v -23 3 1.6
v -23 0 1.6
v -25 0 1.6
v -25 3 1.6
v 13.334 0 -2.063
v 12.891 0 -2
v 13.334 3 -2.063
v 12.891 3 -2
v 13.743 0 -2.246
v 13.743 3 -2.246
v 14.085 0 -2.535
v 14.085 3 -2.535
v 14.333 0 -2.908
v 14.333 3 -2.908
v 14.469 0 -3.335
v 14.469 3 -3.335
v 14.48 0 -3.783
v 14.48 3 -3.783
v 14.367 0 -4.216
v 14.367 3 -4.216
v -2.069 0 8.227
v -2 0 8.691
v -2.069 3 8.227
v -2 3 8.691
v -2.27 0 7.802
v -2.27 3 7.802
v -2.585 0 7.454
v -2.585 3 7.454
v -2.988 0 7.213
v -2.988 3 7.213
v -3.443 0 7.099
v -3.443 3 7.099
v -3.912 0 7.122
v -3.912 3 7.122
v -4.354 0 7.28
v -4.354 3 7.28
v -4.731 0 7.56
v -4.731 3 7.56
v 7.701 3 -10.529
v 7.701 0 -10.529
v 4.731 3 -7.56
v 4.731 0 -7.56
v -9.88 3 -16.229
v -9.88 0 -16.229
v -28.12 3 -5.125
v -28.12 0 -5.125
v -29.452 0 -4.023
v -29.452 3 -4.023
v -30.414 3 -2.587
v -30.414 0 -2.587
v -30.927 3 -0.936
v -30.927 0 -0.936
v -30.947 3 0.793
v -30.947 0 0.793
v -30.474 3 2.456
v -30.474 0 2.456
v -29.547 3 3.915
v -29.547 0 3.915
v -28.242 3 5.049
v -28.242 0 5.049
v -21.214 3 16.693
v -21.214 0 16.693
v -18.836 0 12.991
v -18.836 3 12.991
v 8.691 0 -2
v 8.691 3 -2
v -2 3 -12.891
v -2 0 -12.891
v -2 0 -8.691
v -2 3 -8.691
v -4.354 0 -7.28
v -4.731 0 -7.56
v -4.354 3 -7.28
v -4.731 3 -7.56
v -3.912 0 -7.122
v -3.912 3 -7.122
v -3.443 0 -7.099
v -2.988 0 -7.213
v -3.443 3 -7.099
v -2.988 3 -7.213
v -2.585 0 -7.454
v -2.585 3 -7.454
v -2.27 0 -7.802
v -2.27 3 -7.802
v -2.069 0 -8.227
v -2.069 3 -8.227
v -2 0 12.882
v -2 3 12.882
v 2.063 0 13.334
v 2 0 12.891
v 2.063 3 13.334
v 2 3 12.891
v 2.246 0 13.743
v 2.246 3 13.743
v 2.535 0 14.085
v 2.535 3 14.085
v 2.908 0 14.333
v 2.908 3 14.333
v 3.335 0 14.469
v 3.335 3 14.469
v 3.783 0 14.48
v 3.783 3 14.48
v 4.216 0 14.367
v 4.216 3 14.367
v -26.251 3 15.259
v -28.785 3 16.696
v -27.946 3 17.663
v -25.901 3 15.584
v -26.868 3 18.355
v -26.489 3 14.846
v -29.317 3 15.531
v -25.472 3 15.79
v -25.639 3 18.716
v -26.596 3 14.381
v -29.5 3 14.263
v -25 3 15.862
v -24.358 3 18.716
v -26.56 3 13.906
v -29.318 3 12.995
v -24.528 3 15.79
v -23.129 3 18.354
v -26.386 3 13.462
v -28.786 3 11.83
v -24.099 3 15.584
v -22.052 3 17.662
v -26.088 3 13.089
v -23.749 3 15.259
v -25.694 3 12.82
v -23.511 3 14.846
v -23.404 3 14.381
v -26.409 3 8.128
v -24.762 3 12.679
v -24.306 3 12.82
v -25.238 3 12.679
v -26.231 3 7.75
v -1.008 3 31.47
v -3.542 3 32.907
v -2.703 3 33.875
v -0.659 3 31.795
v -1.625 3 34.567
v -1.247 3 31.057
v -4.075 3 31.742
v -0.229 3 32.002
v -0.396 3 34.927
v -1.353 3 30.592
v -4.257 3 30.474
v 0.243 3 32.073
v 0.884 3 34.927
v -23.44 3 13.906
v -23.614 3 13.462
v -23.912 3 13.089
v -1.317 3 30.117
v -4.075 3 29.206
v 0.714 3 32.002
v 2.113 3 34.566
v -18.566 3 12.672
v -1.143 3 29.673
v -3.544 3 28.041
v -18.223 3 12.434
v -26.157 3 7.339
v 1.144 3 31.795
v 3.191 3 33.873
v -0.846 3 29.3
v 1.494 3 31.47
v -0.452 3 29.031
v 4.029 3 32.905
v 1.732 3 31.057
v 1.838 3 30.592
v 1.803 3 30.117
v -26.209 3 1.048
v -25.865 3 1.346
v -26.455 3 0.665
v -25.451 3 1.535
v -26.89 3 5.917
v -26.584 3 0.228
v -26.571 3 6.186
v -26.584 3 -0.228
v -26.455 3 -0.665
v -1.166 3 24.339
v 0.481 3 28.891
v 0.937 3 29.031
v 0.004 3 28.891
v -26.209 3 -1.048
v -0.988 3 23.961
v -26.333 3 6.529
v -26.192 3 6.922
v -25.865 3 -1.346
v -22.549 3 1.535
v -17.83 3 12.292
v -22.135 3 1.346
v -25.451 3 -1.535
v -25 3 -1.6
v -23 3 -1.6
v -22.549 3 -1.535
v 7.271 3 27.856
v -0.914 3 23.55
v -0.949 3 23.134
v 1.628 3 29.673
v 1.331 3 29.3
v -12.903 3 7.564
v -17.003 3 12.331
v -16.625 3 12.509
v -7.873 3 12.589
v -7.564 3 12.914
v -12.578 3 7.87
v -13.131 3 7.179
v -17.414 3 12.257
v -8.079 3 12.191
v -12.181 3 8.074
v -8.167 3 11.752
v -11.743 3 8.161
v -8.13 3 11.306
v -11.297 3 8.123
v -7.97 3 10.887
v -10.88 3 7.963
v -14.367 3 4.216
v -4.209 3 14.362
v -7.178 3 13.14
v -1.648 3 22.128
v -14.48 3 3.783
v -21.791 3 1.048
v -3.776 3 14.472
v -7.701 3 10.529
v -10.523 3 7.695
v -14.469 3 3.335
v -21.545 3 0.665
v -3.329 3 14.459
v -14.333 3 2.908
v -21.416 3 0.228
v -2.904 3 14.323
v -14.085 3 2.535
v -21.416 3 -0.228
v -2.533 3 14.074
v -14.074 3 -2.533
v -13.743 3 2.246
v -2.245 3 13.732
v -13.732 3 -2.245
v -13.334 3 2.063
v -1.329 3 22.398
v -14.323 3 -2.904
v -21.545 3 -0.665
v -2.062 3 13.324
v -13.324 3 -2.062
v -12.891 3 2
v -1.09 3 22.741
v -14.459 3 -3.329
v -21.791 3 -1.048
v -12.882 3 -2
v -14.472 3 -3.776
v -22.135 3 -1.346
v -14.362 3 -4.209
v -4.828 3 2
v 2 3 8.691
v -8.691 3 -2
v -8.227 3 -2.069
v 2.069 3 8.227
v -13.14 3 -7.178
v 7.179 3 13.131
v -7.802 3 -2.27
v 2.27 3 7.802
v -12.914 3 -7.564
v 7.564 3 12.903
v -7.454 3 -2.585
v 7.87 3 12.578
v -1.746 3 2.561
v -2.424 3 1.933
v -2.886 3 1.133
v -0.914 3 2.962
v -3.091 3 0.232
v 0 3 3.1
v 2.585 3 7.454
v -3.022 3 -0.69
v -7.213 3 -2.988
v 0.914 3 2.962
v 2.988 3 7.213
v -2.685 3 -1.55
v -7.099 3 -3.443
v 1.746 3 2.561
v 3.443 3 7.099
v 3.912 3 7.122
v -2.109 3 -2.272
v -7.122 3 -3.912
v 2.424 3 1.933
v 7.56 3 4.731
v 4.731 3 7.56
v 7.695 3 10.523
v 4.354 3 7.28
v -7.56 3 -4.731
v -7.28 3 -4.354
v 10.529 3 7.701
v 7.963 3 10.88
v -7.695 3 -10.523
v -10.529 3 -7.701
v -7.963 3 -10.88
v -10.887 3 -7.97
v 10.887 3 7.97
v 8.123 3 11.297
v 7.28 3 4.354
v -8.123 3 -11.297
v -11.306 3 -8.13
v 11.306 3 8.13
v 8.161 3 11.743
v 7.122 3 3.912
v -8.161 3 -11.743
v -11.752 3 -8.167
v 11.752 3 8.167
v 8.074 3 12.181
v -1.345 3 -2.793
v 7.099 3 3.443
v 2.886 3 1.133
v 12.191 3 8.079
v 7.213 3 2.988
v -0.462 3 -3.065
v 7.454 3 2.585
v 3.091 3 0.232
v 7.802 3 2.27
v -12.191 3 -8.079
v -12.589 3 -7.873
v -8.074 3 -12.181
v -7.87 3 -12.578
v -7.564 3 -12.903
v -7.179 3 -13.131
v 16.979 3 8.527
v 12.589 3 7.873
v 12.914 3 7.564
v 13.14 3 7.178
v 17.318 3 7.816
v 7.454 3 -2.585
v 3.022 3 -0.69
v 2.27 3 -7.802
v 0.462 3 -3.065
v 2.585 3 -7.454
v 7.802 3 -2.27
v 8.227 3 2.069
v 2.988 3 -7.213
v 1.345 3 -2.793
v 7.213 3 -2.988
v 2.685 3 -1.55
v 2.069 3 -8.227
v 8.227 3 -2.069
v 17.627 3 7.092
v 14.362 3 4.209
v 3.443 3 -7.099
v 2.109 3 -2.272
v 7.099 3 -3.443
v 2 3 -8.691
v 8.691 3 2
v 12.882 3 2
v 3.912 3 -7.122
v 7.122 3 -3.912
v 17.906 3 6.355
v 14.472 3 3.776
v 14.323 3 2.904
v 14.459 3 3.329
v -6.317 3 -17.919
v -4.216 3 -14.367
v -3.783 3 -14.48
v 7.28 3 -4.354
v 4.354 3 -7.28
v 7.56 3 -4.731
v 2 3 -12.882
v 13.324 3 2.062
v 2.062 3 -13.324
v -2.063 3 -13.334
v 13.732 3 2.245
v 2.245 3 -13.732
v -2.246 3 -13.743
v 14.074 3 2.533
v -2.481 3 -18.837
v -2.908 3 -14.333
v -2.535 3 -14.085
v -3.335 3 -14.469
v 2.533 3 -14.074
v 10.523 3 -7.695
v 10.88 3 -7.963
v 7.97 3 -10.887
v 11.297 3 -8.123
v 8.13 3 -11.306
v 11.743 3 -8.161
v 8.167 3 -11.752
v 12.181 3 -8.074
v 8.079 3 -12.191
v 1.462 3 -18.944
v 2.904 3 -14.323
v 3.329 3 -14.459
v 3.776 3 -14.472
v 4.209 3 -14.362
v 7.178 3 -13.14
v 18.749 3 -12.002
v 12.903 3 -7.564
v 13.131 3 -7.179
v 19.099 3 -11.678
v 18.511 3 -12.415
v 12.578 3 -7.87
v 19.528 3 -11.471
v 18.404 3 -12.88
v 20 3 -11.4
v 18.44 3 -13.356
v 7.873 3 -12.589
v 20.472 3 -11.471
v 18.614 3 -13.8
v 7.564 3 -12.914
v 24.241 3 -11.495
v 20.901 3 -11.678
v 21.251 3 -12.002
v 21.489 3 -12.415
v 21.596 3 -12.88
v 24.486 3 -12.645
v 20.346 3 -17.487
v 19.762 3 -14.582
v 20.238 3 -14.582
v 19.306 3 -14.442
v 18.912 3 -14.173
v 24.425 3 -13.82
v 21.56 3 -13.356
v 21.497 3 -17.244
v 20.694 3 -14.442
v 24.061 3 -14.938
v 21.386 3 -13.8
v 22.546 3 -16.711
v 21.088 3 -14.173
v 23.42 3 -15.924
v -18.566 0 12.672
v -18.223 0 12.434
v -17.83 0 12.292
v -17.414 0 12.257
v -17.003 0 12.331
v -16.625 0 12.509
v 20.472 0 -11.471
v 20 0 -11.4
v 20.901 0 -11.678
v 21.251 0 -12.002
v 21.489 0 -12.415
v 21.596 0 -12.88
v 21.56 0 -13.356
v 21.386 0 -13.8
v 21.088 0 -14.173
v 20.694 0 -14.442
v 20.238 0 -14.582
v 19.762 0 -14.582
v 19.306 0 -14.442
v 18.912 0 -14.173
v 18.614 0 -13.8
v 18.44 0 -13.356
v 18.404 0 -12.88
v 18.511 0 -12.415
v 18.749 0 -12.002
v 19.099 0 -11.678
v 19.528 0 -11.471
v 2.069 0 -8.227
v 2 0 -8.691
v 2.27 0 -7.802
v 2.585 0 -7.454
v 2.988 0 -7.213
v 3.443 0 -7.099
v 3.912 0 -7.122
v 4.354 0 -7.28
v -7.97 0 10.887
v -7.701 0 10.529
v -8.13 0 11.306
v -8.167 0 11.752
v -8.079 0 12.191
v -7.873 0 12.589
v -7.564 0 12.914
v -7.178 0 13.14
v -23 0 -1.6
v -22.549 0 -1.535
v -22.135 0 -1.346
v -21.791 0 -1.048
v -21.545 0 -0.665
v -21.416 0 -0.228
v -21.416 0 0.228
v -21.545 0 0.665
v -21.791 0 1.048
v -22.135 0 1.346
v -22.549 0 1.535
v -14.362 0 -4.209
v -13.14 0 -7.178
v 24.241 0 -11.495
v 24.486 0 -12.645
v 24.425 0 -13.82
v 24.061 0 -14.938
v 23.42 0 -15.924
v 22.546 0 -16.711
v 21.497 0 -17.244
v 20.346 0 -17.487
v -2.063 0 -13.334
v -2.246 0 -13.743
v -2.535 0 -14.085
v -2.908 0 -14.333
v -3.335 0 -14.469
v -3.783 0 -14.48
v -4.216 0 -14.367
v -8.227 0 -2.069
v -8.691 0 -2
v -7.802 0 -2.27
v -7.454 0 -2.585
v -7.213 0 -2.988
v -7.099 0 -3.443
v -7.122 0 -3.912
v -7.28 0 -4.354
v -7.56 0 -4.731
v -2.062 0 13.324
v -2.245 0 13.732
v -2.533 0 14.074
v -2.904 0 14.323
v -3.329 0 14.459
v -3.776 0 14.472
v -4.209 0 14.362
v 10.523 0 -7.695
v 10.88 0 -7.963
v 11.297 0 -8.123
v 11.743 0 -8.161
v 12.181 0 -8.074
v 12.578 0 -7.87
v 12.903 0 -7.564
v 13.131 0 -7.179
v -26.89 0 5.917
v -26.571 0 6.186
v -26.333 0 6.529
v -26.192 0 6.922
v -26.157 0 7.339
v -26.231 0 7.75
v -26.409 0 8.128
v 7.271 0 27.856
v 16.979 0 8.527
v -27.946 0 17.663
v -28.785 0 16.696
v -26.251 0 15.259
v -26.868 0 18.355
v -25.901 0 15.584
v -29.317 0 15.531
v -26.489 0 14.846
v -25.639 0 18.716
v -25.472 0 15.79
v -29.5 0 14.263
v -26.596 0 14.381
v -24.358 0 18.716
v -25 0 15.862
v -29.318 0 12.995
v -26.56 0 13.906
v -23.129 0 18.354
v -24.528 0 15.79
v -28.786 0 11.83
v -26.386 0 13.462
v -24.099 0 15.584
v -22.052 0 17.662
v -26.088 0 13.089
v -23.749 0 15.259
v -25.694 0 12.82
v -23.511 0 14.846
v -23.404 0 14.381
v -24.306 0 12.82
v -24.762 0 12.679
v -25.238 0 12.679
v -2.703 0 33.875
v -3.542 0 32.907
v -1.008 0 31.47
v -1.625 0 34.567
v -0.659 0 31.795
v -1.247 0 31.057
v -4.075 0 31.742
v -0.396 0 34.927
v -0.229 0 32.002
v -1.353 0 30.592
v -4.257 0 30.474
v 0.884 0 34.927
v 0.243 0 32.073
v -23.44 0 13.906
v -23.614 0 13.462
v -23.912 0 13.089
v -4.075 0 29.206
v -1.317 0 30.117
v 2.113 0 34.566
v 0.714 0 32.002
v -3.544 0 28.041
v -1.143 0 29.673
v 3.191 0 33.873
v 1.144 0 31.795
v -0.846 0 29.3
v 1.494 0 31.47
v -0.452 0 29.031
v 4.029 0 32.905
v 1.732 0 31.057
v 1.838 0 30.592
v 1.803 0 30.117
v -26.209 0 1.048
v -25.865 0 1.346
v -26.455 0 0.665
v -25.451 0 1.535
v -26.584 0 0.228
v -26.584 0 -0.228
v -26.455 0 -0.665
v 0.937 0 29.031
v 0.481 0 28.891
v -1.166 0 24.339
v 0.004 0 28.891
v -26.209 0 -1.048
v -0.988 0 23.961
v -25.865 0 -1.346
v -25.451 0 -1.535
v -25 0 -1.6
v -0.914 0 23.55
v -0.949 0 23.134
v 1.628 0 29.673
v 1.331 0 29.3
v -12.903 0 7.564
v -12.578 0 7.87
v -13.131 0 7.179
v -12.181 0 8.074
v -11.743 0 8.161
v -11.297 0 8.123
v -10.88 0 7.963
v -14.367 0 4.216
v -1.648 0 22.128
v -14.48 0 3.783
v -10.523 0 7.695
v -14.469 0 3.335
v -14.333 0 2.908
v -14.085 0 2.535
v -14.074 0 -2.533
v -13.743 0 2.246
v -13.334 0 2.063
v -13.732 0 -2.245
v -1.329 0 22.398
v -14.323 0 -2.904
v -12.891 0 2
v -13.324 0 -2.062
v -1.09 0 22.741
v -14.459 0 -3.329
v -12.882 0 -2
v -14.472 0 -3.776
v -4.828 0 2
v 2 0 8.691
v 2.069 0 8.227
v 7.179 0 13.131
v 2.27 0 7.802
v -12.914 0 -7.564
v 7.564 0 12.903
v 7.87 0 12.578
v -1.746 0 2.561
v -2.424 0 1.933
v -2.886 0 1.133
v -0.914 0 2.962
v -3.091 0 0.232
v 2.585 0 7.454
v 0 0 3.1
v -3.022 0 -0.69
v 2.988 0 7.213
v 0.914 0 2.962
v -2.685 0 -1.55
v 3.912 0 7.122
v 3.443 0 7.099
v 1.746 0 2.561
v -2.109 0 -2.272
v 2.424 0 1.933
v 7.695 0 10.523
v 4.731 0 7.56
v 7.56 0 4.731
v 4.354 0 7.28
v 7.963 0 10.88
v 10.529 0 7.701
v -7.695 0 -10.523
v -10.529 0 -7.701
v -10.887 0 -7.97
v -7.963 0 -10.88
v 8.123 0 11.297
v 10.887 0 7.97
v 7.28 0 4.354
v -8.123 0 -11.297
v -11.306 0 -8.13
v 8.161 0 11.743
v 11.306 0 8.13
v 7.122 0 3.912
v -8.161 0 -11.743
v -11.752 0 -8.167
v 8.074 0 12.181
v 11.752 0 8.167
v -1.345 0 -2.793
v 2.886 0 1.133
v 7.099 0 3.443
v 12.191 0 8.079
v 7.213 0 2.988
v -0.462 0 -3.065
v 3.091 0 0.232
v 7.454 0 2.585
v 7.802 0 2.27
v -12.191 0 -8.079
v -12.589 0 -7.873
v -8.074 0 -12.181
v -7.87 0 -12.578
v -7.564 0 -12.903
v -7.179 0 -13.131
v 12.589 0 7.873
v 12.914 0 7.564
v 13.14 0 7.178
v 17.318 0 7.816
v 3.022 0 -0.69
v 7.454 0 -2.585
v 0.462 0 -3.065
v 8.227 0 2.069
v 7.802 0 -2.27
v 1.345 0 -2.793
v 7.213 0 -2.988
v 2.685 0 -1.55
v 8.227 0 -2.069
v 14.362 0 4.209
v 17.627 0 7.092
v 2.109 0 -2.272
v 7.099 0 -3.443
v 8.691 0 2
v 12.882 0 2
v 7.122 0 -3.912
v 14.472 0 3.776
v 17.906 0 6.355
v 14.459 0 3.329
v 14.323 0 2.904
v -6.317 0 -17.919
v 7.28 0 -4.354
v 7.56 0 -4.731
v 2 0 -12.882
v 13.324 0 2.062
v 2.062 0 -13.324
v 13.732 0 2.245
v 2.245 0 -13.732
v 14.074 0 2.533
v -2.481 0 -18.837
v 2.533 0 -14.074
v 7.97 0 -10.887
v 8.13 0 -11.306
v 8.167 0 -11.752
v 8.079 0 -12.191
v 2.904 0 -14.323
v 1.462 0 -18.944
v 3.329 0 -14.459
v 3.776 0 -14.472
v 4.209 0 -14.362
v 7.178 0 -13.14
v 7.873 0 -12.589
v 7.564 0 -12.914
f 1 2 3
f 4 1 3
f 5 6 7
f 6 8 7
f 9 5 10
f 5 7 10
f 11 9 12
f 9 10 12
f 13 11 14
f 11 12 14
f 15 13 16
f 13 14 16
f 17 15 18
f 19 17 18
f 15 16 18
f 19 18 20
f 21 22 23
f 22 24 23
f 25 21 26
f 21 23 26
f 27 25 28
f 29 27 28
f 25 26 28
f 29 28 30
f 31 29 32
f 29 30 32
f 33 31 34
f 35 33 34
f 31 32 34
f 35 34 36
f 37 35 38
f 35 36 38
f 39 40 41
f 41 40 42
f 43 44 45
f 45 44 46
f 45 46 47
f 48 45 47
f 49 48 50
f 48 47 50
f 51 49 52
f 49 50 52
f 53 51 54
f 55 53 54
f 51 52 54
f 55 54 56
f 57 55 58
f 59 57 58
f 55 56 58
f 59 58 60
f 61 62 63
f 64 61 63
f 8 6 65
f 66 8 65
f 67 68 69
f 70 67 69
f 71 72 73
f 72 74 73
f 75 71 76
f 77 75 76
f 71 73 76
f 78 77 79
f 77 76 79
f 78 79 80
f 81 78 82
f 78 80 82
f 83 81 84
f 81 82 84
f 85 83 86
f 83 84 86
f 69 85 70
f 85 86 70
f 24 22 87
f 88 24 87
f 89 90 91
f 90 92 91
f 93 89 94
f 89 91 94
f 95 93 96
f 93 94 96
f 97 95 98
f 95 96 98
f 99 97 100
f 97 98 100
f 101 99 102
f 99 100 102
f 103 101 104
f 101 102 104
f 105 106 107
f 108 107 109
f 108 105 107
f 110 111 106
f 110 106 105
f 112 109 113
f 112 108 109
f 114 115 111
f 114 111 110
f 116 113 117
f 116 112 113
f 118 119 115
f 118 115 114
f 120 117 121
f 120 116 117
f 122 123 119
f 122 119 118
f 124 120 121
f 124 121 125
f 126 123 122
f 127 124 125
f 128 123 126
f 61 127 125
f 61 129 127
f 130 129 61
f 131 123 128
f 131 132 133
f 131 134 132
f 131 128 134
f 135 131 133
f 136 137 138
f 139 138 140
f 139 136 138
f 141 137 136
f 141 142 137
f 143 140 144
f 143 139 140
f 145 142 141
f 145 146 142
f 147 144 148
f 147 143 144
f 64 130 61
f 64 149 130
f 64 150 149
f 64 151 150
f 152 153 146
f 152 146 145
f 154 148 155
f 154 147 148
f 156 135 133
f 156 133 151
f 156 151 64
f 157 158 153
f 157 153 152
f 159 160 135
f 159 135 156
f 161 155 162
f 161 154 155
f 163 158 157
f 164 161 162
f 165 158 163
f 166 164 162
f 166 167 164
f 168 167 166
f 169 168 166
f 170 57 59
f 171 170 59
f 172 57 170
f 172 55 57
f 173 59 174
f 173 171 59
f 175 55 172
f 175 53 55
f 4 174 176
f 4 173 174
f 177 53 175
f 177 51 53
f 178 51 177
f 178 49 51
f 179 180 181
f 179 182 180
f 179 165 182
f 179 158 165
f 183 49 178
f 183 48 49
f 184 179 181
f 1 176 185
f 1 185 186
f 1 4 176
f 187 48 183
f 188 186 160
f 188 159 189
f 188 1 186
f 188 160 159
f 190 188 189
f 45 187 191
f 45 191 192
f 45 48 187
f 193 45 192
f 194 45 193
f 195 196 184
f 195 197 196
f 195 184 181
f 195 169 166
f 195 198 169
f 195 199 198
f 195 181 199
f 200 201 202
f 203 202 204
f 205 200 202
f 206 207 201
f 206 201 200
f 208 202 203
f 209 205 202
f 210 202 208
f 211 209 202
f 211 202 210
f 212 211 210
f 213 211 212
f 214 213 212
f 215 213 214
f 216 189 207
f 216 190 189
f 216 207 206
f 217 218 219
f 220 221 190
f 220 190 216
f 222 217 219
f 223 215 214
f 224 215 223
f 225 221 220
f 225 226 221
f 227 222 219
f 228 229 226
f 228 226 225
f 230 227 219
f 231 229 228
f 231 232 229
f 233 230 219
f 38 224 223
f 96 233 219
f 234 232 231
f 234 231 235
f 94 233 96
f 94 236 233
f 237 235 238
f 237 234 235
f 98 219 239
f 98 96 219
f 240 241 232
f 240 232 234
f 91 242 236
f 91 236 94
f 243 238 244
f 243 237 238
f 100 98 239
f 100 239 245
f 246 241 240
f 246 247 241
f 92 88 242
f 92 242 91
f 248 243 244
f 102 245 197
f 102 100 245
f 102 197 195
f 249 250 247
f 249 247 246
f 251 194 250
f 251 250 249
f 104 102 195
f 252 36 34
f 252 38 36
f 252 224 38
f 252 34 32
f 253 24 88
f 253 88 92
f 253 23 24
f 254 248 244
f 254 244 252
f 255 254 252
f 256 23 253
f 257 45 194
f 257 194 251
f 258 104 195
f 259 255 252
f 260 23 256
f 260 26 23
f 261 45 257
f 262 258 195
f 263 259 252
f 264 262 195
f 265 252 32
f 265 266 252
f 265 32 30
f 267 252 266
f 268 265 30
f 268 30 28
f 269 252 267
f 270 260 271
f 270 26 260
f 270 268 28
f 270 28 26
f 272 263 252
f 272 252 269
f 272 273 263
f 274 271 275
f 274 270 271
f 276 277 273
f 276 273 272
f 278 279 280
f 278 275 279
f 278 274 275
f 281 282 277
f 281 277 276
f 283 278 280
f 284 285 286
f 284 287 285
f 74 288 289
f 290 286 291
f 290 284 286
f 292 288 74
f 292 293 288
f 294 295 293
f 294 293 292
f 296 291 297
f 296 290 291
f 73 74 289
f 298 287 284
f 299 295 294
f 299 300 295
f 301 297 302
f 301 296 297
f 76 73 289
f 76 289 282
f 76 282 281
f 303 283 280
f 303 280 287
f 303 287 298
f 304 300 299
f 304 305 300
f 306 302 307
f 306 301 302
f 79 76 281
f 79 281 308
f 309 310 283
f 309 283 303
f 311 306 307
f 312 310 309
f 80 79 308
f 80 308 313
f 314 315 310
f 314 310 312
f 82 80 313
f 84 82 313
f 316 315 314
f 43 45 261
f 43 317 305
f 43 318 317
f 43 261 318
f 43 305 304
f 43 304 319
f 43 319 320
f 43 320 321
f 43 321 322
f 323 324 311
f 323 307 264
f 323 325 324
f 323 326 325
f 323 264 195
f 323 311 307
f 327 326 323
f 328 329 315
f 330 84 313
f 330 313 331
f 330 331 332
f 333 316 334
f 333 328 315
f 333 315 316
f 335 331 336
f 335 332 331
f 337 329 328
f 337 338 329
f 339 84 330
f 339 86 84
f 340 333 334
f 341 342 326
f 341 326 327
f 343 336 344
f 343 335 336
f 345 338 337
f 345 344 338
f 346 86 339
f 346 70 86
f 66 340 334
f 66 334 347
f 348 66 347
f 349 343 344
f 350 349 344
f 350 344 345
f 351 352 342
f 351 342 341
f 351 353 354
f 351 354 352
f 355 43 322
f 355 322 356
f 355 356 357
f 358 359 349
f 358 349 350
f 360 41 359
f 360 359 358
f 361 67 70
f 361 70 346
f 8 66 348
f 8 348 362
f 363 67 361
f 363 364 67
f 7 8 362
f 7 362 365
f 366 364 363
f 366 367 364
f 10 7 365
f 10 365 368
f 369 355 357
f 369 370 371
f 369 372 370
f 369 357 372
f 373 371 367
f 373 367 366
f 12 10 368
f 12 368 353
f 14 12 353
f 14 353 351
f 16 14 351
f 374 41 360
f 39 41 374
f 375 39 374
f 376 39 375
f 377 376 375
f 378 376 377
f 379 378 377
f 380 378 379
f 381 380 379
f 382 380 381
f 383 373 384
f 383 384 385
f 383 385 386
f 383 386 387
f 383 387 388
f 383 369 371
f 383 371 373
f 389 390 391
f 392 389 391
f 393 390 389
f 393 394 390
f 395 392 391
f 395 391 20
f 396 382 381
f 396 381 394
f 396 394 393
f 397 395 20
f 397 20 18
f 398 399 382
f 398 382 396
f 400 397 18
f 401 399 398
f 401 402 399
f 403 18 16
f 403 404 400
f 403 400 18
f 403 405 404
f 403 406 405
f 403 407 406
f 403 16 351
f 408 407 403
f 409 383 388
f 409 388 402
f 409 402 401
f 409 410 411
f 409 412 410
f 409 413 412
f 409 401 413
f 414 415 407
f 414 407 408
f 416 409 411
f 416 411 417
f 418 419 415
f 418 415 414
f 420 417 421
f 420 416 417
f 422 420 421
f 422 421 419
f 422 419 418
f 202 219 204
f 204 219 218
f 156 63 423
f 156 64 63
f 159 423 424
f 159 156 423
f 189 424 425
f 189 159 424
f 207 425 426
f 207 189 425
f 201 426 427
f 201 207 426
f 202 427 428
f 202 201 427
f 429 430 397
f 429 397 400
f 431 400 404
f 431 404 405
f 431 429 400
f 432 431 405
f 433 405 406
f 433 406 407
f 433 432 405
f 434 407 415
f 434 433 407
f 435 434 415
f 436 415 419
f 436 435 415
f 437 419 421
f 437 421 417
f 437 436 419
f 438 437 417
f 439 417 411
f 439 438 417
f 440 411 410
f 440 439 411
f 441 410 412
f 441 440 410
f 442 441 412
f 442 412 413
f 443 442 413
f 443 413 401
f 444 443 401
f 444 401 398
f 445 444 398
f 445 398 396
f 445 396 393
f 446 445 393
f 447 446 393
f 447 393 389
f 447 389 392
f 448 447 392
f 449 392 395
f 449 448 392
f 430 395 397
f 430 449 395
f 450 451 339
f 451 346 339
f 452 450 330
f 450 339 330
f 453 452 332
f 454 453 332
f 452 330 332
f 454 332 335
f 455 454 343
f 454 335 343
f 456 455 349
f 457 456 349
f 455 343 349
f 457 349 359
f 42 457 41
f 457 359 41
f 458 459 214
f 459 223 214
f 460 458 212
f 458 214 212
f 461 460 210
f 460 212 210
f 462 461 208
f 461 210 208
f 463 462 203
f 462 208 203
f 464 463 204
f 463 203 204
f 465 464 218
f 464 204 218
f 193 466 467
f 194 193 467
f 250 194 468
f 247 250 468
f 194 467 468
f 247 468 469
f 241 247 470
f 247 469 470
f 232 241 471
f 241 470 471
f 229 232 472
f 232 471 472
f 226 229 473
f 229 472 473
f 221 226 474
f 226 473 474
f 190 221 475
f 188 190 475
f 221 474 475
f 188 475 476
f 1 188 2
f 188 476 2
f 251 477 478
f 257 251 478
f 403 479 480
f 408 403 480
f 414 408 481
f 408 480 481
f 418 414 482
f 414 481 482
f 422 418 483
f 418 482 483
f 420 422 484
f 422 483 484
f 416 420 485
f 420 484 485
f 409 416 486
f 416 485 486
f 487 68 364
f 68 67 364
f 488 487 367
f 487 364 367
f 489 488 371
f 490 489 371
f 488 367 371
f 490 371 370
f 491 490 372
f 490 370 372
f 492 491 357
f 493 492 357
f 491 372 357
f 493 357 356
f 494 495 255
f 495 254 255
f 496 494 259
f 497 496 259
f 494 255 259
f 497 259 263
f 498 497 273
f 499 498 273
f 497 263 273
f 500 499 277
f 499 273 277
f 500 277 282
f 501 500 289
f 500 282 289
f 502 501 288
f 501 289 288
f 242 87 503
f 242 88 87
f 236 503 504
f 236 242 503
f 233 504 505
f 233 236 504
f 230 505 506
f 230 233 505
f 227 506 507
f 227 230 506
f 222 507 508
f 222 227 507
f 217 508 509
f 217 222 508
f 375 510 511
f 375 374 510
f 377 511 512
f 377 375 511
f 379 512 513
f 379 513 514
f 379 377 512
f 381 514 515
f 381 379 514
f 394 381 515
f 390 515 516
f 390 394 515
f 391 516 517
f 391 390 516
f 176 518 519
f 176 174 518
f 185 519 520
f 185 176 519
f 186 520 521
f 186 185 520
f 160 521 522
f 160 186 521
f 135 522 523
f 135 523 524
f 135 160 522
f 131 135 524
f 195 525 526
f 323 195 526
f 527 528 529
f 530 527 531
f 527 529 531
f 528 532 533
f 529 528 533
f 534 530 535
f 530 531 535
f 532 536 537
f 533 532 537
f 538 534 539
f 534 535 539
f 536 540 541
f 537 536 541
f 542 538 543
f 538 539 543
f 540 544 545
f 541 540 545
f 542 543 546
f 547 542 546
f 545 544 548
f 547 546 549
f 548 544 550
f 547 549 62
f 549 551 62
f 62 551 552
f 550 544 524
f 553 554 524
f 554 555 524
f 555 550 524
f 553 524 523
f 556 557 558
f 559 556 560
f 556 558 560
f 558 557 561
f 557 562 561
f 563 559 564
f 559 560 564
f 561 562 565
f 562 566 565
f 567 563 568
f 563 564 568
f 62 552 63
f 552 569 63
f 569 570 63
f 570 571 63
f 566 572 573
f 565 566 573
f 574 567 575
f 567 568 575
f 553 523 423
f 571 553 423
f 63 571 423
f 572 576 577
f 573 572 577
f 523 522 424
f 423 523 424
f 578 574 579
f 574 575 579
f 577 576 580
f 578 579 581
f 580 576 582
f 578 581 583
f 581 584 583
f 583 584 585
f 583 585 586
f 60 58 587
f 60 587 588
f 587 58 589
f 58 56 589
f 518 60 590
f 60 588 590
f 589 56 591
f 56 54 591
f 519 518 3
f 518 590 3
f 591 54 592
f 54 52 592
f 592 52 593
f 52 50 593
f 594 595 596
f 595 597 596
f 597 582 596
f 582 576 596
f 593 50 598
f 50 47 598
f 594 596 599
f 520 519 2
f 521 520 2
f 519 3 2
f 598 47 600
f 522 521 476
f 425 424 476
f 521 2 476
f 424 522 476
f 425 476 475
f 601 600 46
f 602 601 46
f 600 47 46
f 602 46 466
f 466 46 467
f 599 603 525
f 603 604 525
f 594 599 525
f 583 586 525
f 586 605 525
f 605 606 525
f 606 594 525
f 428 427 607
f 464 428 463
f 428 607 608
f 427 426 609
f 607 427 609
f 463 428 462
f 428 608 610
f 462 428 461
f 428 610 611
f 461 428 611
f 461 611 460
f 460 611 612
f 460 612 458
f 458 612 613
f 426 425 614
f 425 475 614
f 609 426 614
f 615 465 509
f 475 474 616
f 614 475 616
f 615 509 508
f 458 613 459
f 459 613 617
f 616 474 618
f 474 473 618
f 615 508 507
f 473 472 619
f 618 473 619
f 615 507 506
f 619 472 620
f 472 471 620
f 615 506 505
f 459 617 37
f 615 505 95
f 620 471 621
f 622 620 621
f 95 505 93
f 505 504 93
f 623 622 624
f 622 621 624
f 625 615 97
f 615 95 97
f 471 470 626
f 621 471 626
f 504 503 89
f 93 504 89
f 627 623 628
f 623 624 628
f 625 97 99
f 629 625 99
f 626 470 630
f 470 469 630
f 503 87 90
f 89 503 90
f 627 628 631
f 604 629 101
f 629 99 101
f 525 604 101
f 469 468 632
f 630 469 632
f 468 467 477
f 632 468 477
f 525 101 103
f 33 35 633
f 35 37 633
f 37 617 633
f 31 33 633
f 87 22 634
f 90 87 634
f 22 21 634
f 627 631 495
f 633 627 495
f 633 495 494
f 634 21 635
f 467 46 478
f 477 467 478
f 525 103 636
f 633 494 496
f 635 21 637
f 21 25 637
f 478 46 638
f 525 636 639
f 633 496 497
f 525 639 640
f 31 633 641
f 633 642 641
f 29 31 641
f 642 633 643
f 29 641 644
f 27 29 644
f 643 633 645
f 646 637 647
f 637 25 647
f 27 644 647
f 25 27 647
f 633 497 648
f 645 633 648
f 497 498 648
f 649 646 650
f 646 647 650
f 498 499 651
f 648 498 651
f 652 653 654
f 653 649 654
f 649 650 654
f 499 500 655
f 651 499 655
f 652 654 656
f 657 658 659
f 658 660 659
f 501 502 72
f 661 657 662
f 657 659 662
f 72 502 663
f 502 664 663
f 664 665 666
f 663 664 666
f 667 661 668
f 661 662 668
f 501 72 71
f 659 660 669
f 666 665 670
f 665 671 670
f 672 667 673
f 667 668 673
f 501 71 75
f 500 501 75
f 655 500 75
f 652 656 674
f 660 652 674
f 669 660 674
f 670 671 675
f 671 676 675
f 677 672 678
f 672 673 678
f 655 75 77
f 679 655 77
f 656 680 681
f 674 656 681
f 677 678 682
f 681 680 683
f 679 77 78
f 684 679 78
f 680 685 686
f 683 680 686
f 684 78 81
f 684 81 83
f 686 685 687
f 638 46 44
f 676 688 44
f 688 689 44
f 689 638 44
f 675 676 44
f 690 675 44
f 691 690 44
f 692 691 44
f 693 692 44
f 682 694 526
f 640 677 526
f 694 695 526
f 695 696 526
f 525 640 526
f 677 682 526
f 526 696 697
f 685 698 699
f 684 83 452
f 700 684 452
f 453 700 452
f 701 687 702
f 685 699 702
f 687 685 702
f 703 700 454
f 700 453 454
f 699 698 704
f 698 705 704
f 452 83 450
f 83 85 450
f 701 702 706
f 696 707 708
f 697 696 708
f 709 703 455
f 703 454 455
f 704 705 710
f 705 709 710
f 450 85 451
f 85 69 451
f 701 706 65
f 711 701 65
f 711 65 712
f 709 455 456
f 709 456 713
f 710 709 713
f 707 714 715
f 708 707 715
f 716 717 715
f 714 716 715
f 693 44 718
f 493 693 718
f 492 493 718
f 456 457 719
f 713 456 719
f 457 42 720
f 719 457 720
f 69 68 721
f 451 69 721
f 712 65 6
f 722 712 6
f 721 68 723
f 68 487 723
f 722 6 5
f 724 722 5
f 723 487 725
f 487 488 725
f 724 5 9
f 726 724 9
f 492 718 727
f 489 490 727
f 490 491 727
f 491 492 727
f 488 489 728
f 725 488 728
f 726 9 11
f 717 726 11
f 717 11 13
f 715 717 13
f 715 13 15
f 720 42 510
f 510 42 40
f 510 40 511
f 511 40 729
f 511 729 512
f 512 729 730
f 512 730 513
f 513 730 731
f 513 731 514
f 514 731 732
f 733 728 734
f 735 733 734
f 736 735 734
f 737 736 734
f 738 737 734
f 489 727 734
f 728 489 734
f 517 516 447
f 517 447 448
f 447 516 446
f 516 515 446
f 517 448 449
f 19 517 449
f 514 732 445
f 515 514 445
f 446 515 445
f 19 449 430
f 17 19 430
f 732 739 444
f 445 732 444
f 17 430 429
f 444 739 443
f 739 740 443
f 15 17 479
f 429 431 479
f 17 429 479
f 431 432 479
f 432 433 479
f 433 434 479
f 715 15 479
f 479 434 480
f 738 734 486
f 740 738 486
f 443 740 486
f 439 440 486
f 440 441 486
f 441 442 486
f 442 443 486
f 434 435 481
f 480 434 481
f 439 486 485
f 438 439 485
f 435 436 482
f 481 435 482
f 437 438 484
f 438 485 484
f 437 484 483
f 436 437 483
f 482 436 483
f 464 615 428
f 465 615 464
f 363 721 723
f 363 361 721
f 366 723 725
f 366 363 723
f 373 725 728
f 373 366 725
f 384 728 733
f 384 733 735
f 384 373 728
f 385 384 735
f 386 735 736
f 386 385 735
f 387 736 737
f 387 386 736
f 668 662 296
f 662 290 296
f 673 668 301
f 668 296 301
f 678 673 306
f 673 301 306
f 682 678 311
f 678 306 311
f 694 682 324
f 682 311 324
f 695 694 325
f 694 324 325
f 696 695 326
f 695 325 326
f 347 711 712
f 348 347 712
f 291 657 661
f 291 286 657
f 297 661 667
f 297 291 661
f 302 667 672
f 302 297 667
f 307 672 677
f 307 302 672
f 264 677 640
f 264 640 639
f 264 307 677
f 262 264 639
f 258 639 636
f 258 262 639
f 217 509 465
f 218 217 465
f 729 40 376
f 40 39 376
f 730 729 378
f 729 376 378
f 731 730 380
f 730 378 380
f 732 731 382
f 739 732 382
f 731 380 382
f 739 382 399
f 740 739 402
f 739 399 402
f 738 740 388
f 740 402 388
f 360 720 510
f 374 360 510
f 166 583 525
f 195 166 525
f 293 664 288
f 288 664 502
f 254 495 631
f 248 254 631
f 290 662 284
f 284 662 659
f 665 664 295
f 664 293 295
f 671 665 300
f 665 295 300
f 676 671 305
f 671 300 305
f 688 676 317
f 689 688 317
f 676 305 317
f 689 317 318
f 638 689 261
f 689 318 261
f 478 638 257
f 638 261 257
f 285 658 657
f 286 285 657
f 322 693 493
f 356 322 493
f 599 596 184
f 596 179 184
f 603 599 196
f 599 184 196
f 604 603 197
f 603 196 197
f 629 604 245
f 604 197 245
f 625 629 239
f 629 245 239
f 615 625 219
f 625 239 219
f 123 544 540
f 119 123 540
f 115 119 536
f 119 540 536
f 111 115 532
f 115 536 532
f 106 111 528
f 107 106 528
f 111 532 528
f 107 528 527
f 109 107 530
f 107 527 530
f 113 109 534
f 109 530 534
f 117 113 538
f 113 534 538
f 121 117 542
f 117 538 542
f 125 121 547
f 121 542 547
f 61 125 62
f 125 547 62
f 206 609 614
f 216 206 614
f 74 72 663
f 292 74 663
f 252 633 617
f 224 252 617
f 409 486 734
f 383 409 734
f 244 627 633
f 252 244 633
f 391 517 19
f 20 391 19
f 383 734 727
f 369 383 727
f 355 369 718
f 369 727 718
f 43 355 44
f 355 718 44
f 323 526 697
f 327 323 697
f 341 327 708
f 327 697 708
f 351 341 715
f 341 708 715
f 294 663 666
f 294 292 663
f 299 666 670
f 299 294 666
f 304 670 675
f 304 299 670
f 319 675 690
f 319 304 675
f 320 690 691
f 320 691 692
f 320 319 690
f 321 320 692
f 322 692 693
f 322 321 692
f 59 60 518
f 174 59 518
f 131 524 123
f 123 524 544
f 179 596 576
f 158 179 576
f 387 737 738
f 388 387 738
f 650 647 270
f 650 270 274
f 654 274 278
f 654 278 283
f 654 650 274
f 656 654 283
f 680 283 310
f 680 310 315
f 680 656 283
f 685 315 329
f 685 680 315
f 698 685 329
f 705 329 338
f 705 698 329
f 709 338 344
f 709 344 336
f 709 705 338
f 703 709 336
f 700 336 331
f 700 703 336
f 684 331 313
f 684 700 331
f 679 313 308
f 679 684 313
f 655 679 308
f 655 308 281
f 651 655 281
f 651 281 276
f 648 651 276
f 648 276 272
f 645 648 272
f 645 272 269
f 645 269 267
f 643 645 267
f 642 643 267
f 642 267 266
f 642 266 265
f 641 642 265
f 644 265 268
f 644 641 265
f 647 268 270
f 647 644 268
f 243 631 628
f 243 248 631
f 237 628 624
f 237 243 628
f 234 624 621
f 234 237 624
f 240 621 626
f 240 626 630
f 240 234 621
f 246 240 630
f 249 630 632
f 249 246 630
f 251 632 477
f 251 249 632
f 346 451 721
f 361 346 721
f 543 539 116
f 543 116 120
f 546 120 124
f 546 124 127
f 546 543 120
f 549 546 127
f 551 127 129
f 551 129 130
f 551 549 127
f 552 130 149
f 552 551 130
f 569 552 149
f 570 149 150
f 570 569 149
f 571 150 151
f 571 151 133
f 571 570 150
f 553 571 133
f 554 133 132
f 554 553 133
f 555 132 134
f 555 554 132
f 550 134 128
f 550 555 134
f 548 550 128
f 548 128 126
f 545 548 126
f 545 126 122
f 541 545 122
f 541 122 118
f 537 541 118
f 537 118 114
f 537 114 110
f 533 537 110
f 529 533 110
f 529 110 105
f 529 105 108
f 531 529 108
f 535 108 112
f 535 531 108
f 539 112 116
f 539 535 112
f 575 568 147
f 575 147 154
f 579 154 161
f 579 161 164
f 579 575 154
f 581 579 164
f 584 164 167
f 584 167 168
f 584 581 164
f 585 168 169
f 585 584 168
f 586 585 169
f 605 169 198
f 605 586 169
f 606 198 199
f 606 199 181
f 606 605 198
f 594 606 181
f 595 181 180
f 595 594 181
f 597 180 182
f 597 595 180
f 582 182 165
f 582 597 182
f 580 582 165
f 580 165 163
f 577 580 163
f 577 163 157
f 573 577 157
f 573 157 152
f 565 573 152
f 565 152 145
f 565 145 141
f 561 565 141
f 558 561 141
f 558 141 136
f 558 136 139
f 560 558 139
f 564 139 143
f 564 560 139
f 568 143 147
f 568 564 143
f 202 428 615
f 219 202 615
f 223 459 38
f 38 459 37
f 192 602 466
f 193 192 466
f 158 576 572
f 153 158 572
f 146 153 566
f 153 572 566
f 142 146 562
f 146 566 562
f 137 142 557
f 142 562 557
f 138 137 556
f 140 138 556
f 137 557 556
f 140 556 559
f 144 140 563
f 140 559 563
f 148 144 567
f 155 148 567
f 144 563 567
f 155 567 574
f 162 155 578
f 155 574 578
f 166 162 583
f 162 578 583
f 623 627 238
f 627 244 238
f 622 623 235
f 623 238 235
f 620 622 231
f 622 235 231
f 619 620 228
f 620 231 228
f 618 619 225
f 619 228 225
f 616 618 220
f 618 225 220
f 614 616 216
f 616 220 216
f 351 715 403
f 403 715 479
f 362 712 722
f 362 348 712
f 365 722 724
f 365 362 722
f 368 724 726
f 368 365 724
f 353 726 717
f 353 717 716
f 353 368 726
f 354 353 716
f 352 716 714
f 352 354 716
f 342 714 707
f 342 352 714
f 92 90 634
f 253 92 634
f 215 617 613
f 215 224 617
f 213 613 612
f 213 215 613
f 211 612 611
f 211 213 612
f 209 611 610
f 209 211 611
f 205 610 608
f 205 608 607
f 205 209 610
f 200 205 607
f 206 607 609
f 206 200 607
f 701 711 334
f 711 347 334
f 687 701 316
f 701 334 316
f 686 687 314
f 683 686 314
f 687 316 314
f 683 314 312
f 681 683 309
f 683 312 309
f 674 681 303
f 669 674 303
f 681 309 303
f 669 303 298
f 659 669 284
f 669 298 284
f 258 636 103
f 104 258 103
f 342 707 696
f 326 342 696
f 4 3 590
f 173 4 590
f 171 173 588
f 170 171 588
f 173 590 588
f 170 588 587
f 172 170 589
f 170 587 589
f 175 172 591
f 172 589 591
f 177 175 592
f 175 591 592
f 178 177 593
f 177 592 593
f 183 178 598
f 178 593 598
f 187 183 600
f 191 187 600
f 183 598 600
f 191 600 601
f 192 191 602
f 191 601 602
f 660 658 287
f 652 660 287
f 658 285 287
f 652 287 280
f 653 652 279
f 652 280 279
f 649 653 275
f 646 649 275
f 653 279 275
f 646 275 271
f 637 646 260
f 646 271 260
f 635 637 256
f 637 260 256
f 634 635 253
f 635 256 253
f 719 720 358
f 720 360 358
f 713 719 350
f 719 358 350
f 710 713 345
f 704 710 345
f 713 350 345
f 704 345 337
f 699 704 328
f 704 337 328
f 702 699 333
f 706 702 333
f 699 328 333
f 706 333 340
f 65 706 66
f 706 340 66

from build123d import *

# Parameters (mm, degrees)
SKETCH_1_R      = 1.6
SKETCH_1_R_2    = 3.1
EXTRUDE_1_DEPTH = 3
FILLET_1_R      = 1.6


with BuildPart() as part:
    # 草图1 → 凸台-拉伸1 (new body)
    with BuildSketch(Plane(origin=(0, 0, 0), x_dir=(1, 0, 0), z_dir=(0, 1, 0))):
        with BuildLine():
            Line((20.346167364, 17.486665594), (1.461595535, 18.943699177))
            ThreePointArc((1.461595535, 18.943699177), (-4.422619767, 18.478106894), (-9.88, 16.229158943))
            Line((-9.88, 16.229158943), (-28.12, 5.124997561))
            ThreePointArc((-28.12, 5.124997561), (-30.999566723, 0.072105046), (-28.242269316, -5.048533419))
            Line((-28.242269316, -5.048533419), (-25.544130748, -6.781332069))
            Line((-25.544130748, -6.781332069), (-28.786400064, -11.829865488))
            ThreePointArc((-28.786400064, -11.829865488), (-27.431701987, -18.047967539), (-21.213599936, -16.693269462))
            Line((-21.213599936, -16.693269462), (-17.97133062, -11.644736044))
            Line((-17.97133062, -11.644736044), (-0.301463654, -22.992678651))
            Line((-0.301463654, -22.992678651), (-3.543732971, -28.04121207))
            ThreePointArc((-3.543732971, -28.04121207), (-2.189034894, -34.259314121), (4.029067158, -32.904616044))
            Line((4.029067158, -32.904616044), (7.271336474, -27.856082626))
            Line((7.271336474, -27.856082626), (16.97889821, -8.527427253))
            ThreePointArc((16.97889821, -8.527427253), (17.476097582, -7.455602812), (17.905715537, -6.35494698))
            Line((17.905715537, -6.35494698), (24.240827364, 11.494880978))
            ThreePointArc((24.240827364, 11.494880978), (23.772996273, 15.452447578), (20.346167364, 17.486665594))
        make_face()
        Polygon((-12.211829252, -9.383402127), (-15.291662532, -2), (-4.828427125, -2), align=None, mode=Mode.SUBTRACT)
        Polygon((-15.270134549, 2), (-12.227051834, 9.398624709), (-4.828427125, 2), align=None, mode=Mode.SUBTRACT)
        Polygon((-9.383402127, 12.211829252), (-2, 15.291662532), (-2, 4.828427125), align=None, mode=Mode.SUBTRACT)
        Polygon((2, 15.270134549), (9.398624709, 12.227051834), (2, 4.828427125), align=None, mode=Mode.SUBTRACT)
        Polygon((12.211829252, 9.383402127), (15.291662532, 2), (4.828427125, 2), align=None, mode=Mode.SUBTRACT)
        Polygon((15.270134549, -2), (12.227051834, -9.398624709), (4.828427125, -2), align=None, mode=Mode.SUBTRACT)
        Polygon((9.383402127, -12.211829252), (2, -15.291662532), (2, -4.828427125), align=None, mode=Mode.SUBTRACT)
        Polygon((-2, -15.270134549), (-9.398624709, -12.227051834), (-2, -4.828427125), align=None, mode=Mode.SUBTRACT)
        with Locations(Location((20, 13, 0), (0, 0, 270))):
            Circle(SKETCH_1_R, mode=Mode.SUBTRACT)
        with BuildLine():
            Line((-25, 1.6), (-23, 1.6))
            ThreePointArc((-23, 1.6), (-21.4, 0), (-23, -1.6))
            Line((-23, -1.6), (-25, -1.6))
            ThreePointArc((-25, -1.6), (-26.6, 0), (-25, 1.6))
        make_face(mode=Mode.SUBTRACT)
        with Locations(Location((0.242667093, -30.472914057, 0), (0, 0, 270))):
            Circle(SKETCH_1_R, mode=Mode.SUBTRACT)
        with Locations(Location((-25, -14.261567475, 0), (0, 0, 270))):
            Circle(SKETCH_1_R, mode=Mode.SUBTRACT)
        with Locations(Location((0, 0, 0), (0, 0, 270))):
            Circle(SKETCH_1_R_2, mode=Mode.SUBTRACT)
    extrude(amount=EXTRUDE_1_DEPTH)

    # 圆角1
    fillet_1_edges = [part.edges().sort_by_distance(p)[0] for p in [
        (15.291662532, 1.5, -2),
        (12.211829252, 1.5, -9.383402127),
        (4.828427125, 1.5, -2),
        (9.398624709, 1.5, -12.227051834),
        (2, 1.5, -15.270134549),
        (2, 1.5, -4.828427125),
        (-2, 1.5, -15.291662532),
        (-9.383402127, 1.5, -12.211829252),
        (-2, 1.5, -4.828427125),
        (-12.227051834, 1.5, -9.398624709),
        (-15.270134549, 1.5, -2),
        (-4.828427125, 1.5, -2),
        (-15.291662532, 1.5, 2),
        (-12.211829252, 1.5, 9.383402127),
        (-9.398624709, 1.5, 12.227051834),
        (-2, 1.5, 15.270134549),
        (-2, 1.5, 4.828427125),
        (2, 1.5, 15.291662532),
        (9.383402127, 1.5, 12.211829252),
        (2, 1.5, 4.828427125),
        (12.227051834, 1.5, 9.398624709),
        (15.270134549, 1.5, 2),
        (4.828427125, 1.5, 2),
        (-0.301463654, 1.5, 22.992678651),
        (-17.97133062, 1.5, 11.644736044),
        (-25.544130748, 1.5, 6.781332069),
    ]]
    fillet(fillet_1_edges, radius=FILLET_1_R)


solid = part.part
